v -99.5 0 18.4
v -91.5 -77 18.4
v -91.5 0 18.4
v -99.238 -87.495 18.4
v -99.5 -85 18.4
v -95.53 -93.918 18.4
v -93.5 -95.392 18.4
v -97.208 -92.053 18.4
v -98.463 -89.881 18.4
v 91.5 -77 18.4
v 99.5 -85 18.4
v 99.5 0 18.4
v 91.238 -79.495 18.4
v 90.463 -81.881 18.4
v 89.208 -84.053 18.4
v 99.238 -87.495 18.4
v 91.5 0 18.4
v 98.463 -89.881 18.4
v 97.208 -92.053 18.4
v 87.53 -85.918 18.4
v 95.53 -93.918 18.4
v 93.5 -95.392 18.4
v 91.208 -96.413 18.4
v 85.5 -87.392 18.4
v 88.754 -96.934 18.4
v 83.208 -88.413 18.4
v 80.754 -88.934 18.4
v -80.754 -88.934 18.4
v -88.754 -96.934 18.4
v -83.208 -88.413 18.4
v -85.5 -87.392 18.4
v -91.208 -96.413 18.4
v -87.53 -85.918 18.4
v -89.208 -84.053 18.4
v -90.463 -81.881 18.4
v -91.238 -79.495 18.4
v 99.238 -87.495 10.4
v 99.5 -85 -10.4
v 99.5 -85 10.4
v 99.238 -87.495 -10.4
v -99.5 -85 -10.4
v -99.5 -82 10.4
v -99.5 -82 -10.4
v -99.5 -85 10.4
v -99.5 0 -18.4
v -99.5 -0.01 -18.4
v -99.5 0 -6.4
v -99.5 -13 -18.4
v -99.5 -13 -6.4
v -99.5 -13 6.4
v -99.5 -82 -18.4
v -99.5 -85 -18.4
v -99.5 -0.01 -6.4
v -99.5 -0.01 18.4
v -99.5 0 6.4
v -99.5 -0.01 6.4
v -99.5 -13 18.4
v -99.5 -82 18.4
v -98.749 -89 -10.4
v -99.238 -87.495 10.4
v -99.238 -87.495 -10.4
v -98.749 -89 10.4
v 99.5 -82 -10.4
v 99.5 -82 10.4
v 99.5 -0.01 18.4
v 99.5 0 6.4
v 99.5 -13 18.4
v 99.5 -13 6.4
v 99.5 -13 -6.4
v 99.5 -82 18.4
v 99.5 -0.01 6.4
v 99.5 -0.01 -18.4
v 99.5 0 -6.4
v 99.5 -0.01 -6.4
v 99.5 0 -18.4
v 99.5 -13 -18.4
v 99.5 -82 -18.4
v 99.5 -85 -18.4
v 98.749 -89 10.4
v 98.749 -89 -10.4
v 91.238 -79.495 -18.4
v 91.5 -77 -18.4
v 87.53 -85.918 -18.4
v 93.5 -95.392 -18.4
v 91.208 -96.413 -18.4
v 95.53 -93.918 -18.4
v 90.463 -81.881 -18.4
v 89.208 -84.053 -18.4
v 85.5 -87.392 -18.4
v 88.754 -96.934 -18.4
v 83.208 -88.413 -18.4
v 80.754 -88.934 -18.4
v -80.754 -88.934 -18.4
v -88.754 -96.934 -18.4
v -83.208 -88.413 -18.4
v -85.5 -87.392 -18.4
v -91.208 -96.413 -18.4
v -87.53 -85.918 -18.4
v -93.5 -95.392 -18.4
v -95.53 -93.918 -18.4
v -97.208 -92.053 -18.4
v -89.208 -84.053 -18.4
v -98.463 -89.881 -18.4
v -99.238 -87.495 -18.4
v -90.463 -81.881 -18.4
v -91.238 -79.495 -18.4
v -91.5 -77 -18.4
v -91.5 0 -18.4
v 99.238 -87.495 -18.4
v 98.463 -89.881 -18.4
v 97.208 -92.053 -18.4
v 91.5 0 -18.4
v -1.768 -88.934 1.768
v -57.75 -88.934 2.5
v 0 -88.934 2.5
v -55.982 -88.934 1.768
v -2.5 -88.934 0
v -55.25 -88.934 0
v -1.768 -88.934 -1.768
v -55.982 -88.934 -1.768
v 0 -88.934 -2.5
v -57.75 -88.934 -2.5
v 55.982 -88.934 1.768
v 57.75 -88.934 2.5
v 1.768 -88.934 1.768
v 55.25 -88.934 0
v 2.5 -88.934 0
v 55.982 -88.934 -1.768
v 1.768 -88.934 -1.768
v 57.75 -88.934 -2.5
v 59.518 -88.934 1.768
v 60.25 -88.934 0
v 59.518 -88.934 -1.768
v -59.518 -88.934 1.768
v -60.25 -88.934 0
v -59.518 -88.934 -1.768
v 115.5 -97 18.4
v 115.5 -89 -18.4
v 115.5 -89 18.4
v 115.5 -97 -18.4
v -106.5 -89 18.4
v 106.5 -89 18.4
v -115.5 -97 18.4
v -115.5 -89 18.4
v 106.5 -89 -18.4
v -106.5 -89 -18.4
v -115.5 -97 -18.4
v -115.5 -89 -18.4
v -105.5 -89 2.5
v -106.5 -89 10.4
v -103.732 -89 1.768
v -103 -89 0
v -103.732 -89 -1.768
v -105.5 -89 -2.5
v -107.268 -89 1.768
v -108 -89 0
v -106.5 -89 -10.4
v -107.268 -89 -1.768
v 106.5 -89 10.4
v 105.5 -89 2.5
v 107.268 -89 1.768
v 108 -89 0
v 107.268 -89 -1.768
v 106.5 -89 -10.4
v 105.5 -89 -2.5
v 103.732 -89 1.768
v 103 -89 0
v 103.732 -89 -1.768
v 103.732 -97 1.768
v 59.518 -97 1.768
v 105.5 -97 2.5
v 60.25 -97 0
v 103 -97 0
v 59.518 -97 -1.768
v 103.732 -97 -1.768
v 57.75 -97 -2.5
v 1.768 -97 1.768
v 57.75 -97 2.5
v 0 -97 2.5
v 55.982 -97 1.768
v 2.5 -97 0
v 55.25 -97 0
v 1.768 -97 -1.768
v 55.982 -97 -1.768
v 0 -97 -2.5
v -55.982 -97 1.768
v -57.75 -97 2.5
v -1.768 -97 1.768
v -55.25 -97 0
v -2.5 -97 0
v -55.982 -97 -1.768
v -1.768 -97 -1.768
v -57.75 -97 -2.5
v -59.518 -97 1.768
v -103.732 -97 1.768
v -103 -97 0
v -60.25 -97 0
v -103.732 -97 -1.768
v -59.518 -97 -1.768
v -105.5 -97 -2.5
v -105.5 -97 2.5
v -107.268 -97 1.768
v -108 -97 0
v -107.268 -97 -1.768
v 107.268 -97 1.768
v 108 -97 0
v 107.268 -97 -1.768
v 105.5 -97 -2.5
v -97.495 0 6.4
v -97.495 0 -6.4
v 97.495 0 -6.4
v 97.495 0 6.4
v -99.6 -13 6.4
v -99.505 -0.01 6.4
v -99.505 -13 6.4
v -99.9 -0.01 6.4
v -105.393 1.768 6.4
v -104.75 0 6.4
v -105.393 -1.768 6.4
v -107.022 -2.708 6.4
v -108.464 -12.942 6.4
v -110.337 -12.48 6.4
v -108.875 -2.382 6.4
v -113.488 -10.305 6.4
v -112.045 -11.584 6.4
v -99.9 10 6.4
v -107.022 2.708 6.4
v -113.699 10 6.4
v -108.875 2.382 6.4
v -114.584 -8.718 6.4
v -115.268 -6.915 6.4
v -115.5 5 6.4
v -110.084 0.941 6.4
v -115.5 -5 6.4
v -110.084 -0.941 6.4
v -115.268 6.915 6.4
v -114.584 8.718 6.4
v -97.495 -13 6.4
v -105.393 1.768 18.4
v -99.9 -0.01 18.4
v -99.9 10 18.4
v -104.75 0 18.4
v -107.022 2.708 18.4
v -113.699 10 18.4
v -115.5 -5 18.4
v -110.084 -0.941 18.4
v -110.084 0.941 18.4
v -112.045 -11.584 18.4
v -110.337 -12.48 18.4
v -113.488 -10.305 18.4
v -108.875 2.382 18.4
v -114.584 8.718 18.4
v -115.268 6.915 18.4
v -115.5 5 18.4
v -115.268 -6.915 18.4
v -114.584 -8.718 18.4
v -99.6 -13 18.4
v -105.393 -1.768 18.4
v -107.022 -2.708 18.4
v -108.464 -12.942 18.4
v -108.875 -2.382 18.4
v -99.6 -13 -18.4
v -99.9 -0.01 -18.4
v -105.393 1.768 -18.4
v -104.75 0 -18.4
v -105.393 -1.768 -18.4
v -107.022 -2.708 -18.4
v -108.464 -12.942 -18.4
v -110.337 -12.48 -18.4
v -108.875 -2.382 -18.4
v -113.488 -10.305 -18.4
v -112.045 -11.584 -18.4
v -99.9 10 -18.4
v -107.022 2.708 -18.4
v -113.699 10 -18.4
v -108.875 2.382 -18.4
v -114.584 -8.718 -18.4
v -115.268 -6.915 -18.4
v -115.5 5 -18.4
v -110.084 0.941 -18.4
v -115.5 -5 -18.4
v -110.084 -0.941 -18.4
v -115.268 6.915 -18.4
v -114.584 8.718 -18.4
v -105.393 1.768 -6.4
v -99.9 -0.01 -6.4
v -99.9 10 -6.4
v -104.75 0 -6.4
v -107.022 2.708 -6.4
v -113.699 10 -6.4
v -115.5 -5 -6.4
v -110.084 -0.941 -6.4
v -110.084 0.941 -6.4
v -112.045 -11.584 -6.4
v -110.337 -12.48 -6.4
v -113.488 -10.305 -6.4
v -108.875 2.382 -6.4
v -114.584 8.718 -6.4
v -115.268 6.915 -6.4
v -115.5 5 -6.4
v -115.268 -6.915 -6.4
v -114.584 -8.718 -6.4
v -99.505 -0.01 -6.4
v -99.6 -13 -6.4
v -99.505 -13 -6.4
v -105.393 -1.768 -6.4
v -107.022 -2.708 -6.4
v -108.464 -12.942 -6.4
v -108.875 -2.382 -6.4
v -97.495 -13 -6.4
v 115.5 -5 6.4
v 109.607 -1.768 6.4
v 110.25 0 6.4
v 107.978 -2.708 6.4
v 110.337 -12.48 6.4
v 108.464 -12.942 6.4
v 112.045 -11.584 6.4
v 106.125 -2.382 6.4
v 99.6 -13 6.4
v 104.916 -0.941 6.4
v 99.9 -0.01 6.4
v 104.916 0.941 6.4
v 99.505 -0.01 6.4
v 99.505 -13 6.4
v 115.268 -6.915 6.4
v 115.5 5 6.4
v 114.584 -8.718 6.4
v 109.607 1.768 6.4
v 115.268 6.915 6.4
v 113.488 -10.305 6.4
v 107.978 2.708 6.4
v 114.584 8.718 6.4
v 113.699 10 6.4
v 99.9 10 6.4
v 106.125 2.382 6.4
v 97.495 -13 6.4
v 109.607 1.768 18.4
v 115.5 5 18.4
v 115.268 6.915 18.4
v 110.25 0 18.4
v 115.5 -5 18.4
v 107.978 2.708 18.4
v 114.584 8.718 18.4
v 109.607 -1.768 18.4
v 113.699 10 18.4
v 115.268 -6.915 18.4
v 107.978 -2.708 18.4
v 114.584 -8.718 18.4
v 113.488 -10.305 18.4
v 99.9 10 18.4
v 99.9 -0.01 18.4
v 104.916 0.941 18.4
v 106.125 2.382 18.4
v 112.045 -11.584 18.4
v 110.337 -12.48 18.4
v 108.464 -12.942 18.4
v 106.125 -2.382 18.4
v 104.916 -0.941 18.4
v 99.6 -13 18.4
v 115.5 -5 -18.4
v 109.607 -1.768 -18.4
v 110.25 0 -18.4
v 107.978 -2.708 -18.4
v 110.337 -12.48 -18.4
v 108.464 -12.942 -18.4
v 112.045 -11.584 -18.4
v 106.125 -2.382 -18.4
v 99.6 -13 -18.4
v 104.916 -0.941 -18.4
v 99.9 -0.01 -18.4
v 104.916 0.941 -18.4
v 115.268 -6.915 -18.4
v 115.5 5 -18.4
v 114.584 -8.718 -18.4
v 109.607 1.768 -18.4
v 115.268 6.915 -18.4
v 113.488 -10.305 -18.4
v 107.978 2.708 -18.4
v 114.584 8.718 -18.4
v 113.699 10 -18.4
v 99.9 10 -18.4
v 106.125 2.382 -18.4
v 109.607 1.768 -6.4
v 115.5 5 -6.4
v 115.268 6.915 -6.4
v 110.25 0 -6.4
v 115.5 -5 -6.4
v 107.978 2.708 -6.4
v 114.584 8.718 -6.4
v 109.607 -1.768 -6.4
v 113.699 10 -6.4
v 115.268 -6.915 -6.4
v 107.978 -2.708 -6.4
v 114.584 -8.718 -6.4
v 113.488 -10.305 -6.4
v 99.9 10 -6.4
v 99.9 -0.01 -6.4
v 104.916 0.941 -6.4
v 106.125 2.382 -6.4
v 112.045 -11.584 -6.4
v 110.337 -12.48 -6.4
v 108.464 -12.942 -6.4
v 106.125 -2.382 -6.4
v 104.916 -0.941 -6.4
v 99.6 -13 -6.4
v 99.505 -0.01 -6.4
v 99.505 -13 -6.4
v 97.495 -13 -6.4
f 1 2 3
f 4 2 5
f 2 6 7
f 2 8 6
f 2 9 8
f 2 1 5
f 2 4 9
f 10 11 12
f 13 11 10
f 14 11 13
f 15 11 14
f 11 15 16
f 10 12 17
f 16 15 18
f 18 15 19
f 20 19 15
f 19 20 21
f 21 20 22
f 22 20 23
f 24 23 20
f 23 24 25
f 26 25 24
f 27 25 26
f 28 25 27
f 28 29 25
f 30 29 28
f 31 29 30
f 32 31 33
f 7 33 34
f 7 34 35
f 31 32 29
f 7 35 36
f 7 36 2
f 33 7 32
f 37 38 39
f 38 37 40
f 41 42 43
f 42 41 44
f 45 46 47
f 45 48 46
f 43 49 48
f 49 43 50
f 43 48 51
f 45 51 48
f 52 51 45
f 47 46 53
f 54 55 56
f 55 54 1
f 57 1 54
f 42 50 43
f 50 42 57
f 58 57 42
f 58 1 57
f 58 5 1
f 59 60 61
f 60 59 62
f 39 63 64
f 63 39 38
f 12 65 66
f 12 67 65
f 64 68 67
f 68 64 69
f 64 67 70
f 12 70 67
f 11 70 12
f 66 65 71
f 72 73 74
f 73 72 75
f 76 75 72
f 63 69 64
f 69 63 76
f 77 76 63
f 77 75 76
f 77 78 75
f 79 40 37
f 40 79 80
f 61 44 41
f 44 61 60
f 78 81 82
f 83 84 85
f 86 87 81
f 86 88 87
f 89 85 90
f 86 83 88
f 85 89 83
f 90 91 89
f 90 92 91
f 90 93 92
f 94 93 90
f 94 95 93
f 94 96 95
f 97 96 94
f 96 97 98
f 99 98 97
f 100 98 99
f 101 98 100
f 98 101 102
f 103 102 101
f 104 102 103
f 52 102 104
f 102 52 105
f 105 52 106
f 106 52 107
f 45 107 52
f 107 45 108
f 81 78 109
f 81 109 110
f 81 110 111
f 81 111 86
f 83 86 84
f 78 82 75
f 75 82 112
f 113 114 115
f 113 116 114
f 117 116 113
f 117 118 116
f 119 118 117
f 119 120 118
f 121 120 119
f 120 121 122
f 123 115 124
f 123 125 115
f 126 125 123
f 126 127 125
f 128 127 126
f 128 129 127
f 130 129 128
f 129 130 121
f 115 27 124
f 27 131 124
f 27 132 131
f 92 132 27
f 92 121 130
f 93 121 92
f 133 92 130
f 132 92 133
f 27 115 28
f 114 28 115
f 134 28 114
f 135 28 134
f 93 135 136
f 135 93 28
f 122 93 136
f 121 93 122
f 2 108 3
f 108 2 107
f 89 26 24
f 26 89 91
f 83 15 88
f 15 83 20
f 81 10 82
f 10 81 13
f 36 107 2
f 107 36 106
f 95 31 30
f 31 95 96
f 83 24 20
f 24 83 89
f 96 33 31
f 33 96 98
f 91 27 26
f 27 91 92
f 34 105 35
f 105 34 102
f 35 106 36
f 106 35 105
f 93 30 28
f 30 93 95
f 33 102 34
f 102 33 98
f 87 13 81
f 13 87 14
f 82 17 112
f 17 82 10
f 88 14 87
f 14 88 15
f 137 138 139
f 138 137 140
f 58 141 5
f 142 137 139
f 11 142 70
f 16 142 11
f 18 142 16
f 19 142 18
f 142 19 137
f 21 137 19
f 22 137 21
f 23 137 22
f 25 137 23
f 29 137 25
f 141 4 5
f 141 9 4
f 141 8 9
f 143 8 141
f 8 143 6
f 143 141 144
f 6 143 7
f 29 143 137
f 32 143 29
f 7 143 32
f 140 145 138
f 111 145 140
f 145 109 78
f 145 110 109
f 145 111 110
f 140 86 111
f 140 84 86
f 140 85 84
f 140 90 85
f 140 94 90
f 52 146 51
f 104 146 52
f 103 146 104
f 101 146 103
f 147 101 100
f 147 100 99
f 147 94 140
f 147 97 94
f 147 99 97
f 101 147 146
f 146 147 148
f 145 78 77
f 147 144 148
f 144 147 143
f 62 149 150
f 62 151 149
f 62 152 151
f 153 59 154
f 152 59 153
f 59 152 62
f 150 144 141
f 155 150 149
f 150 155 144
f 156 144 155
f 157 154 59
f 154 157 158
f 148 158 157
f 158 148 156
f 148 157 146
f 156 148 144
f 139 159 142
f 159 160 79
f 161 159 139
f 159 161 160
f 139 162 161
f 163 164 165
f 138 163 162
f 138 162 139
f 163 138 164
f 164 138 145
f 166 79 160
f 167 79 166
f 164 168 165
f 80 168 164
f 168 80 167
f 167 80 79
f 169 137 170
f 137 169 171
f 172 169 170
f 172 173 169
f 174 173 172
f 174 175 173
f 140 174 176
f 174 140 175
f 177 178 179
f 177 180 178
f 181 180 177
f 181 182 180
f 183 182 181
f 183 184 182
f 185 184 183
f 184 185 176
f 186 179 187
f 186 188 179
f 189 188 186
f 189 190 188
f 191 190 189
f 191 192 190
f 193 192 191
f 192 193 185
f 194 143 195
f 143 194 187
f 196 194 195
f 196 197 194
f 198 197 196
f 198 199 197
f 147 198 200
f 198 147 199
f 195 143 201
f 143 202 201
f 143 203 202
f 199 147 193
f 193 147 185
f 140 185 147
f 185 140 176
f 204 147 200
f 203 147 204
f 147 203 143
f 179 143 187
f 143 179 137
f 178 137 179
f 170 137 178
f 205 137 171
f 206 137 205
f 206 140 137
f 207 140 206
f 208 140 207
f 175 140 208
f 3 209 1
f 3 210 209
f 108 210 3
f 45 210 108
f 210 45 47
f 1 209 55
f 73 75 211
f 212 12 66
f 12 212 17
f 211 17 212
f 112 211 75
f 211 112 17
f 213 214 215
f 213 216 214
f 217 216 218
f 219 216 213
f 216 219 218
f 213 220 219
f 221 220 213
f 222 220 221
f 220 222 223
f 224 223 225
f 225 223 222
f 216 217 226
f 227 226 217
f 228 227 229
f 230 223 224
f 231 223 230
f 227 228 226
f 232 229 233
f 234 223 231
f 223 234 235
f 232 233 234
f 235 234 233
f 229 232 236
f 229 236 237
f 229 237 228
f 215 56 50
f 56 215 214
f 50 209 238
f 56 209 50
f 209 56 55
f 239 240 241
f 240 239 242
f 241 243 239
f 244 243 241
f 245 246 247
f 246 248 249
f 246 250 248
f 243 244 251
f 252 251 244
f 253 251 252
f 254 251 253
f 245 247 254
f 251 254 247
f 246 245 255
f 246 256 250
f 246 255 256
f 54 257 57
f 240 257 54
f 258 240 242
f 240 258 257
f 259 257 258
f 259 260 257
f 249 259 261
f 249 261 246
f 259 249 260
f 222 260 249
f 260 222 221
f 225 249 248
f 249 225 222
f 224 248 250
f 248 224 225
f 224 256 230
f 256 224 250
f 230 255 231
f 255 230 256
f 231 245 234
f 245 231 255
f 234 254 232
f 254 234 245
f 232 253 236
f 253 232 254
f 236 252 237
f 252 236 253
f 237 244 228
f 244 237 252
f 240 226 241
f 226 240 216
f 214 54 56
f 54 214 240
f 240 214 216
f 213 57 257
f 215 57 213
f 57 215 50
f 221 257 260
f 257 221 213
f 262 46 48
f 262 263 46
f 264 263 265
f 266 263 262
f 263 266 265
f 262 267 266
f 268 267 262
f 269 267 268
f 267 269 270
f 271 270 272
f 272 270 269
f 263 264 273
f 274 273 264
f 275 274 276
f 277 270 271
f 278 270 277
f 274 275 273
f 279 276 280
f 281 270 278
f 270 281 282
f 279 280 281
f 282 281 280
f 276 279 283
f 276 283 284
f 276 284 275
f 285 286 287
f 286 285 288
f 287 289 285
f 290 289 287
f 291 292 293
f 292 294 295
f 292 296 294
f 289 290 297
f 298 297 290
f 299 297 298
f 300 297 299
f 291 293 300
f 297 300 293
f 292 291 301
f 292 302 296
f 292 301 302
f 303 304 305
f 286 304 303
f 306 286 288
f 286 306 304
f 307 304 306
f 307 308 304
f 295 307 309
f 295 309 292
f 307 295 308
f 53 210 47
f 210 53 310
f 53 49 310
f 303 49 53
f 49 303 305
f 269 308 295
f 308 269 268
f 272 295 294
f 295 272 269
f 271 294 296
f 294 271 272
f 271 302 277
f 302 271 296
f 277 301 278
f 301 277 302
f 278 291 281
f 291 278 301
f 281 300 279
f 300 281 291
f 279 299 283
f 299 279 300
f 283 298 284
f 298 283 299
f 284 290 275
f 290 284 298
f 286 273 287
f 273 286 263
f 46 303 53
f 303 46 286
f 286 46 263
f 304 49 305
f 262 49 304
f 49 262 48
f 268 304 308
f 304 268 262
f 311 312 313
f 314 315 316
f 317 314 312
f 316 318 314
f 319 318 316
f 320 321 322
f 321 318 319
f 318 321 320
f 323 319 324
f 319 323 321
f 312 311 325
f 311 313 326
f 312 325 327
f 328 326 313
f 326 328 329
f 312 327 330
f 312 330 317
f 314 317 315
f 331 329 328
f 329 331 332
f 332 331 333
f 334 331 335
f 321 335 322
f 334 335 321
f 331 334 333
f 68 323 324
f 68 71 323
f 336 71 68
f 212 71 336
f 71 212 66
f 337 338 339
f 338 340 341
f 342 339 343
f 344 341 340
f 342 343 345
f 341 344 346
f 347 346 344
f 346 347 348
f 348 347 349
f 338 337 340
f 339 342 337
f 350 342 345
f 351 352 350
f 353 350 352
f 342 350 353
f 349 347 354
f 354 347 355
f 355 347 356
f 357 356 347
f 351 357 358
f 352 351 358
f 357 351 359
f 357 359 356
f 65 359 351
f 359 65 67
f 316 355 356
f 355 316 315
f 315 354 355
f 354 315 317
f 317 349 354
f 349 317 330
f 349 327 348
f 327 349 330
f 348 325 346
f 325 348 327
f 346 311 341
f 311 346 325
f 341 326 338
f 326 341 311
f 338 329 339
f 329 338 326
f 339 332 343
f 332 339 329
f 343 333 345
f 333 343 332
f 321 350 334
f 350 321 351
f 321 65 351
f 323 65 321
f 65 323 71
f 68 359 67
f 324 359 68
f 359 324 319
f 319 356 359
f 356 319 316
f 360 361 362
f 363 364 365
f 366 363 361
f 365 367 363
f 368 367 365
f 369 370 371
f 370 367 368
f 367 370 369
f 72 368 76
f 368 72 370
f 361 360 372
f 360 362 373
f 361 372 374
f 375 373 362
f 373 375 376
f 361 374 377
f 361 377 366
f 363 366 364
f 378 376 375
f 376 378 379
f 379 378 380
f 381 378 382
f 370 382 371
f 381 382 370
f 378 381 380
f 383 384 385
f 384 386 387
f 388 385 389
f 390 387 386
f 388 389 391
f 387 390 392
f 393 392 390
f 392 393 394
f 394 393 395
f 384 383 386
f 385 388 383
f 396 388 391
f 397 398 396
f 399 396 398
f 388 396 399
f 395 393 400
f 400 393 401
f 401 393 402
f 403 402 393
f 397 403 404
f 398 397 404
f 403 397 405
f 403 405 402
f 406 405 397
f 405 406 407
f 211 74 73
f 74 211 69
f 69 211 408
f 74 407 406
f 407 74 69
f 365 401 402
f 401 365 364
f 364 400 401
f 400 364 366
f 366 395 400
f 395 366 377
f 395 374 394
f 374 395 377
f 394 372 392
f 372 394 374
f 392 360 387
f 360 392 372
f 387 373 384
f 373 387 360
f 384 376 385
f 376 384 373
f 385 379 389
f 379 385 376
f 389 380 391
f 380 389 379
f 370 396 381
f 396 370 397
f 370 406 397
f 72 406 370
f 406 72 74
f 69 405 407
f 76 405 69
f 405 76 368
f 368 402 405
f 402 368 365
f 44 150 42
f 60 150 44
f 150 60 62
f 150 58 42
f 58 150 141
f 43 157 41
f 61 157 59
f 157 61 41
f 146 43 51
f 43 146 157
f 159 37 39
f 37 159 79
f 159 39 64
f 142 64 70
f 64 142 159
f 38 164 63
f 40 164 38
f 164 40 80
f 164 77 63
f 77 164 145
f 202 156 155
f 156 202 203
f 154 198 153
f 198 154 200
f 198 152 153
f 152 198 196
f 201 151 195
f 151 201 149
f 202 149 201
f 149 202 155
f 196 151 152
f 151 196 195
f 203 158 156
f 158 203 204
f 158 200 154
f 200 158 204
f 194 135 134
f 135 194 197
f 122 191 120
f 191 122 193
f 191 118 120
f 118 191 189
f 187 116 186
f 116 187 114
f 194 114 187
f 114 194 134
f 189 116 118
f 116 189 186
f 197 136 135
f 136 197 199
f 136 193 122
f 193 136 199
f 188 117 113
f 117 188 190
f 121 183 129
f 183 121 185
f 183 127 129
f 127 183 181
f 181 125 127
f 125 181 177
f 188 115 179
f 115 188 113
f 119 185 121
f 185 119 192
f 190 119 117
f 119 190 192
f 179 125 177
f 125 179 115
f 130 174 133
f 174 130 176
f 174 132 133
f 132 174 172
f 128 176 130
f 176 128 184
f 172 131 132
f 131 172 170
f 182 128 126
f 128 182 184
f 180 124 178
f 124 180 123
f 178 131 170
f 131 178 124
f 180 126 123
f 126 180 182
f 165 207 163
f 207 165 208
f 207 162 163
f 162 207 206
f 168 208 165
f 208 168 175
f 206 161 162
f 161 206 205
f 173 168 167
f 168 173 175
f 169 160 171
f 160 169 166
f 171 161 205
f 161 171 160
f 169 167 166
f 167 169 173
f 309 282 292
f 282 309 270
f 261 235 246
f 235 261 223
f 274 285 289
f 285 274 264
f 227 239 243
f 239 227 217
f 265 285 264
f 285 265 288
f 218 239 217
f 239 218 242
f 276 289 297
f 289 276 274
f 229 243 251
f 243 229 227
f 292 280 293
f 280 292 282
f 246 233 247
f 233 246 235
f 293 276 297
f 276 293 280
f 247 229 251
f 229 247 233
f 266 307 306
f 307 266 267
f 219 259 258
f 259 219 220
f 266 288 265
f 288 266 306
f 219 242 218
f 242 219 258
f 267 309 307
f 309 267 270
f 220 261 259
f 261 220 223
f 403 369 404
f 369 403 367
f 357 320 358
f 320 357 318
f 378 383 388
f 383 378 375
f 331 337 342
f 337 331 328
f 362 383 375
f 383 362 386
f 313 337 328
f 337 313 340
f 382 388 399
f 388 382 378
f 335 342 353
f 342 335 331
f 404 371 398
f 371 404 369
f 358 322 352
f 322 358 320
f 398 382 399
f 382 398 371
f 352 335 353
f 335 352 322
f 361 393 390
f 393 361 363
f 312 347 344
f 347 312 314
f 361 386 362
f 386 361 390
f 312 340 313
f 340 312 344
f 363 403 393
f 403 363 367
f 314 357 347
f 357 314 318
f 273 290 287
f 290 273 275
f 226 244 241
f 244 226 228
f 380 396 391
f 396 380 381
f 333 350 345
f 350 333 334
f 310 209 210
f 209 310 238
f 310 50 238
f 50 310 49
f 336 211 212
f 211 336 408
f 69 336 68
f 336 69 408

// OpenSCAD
// file: collar.scad
module raw_collar_profile(w, d, r, wall) {
    difference() {
        union() {
            // 1. Pristine rounded hopper profile ring core
            difference() {
                minkowski() {
                    cube([w + wall*2 - r*2, d + wall*2 - r*2, collar_height], center=true);
                    cylinder(r=r, h=0.001, center=true);
                }
                minkowski() {
                    cube([w - r*2, d - r*2, collar_height + 5], center=true);
                    cylinder(r=r, h=0.001, center=true);
                }
            }
            // 2. Integrated flat mounting wall flange (Kept sharp and flat)
            translate([0, back_y_outer + wall/2, 0])
                cube([backplate_w, wall, collar_height], center=true);
        }
        // Clean out any inner wall bleed from the flat flange block
        minkowski() {
            cube([w - r*2, d - r*2, collar_height + 5], center=true);
            cylinder(r=r, h=0.001, center=true);
        }
    }
}
// file: ear_knuckle.scad
include <params.scad>

module raw_collar_profile(w, d, r, wall) {
    difference() {
        union() {
            // 1. Pristine rounded hopper profile ring core
            difference() {
                minkowski() {
                    cube([w + wall*2 - r*2, d + wall*2 - r*2, collar_height], center=true);
                    cylinder(r=r, h=0.001, center=true);
                }
                minkowski() {
                    cube([w - r*2, d - r*2, collar_height + 5], center=true);
                    cylinder(r=r, h=0.001, center=true);
                }
            }
            // 2. Integrated flat mounting wall flange (Kept sharp and flat)
            translate([0, back_y_outer + wall/2, 0])
                cube([backplate_w, wall, collar_height], center=true);
        }
        // Clean out any inner wall bleed from the flat flange block
        minkowski() {
            cube([w - r*2, d - r*2, collar_height + 5], center=true);
            cylinder(r=r, h=0.001, center=true);
        }
    }
}

// Symmetrical layout math prevents all distortion, fins, and steps
module ear_knuckle_profile(w, d, h, r, x_sign, clear_inner = 0) {
    overlap = 2.0; 
    mirror([x_sign == -1 ? 1 : 0, 0, 0]) {
        linear_extrude(height = h, center = true) {
            difference() {
                // Combine the rounded ear profile with a rock-solid wall anchor pad
                union() {
                    hull() {
                        translate([-w/2, -d/2]) square([0.1, d]);
                        translate([w/2 - r, -d/2 + r]) circle(r);
                        translate([w/2 - r,  d/2 - r]) circle(r); 
                    }
                    translate([-w/2 - overlap, -d/2]) square([overlap + 0.1, d]);
                }
                // Crisp 90-degree rectangle cutout for the slider clearance face (Y >= 0)
                if (clear_inner > 0) {
                    translate([-w/2 - overlap - 0.1, -0.01]) 
                        square([overlap + clear_inner + 0.1, d/2 + 0.1]);
                }
            }
        }
    }
}
// file: params.scad
// --- PRECISE ONEISALL 5L RECTANGULAR HOPPER DIMENSIONS ---
tank_width         = 180;
tank_depth         = 175;
tank_corner_radius = 12;
clamp_height       = 36;
wall_thickness     = 8;
clearance          = 1.5;
screw_hole_dia     = 5.0;

// --- VERTICAL DROP PIN SETTINGS ---
pin_hole_dia  = 5.5;
pin_clearance = 0.4;

// --- HINGE KNUCKLE CLEARANCE ---
knuckle_relief = 0.8;

// --- ASSEMBLY CLEARANCE ---
split_chamfer   = 3.0;
hinge_clearance = 0.4; // The exact horizontal gap needed for a clean sliding fit

// --- HINGE SMOOTHING ---
ear_corner_radius = 8;

/* [Hidden] */
w_inner         = tank_width  + clearance * 2;
d_inner         = tank_depth  + clearance * 2;
ear_width       = 16;
ear_depth       = 26;
knuckle_layer_h = clamp_height / 3;
middle_ear_h    = knuckle_layer_h - pin_clearance - knuckle_relief;
bisect_half     = d_inner / 2 + wall_thickness * 2 + 30;
ear_x           = w_inner / 2 + wall_thickness + ear_width / 2;
ear_z_ctr       = knuckle_layer_h + knuckle_relief / 2;

// Dynamic collar height matching the knuckle vertical thresholds perfectly
collar_height   = ear_z_ctr * 2 + knuckle_layer_h; 

// Compact wing width spans exactly to the outer edge of the hinge knuckles
backplate_w     = (ear_x + ear_width/2) * 2;
back_y_outer    = -(d_inner / 2 + wall_thickness);
// main file
include <params.scad>
include <ear_knuckle.scad>
include <collar.scad>

back_clamp();

module back_clamp() {
    difference() {
        union() {
            // Main unified flat-back hoop body
            difference() {
                raw_collar_profile(w_inner, d_inner, tank_corner_radius, wall_thickness);
                translate([0, bisect_half, 0])
                    cube([w_inner*3, bisect_half*2, collar_height + 40], center=true);
            }
            
            for (x_sign = [-1, 1]) {
                translate([x_sign * ear_x, 0, 0]) {
                    translate([0, 0,  ear_z_ctr])
                        ear_knuckle_profile(ear_width, ear_depth, knuckle_layer_h, ear_corner_radius, x_sign, hinge_clearance);
                    translate([0, 0, -ear_z_ctr])
                        ear_knuckle_profile(ear_width, ear_depth, knuckle_layer_h, ear_corner_radius, x_sign, hinge_clearance);
                }
            }

            // Four corner gussets at backplate/side-wall junctions.
            // Polygon in X-Y plane, extruded in Z.
            // Origin at (x_anchor, back_y_outer): backplate outer face, side wall outer face.
            // Polygon runs +Y along side wall, +X along backplate, with overlap into collar wall.
            stiff_w   = 15; // along backplate in +X
            stiff_d   = 15; // along side wall in +Y
            stiff_h   =  8; // Z height
            overlap_x =  5; // overlap into collar wall in -X to close gap
            x_anchor  = w_inner / 2 + wall_thickness;

            // x_sign = +1
            translate([x_anchor, back_y_outer, collar_height/2 - stiff_h])
                linear_extrude(height = stiff_h)
                    polygon([[0,0],[stiff_w,0],[0,stiff_d],[-overlap_x,0]]);
            translate([x_anchor, back_y_outer, -collar_height/2])
                linear_extrude(height = stiff_h)
                    polygon([[0,0],[stiff_w,0],[0,stiff_d],[-overlap_x,0]]);

            // x_sign = -1: mirror in X
            mirror([1,0,0]) {
                translate([x_anchor, back_y_outer, collar_height/2 - stiff_h])
                    linear_extrude(height = stiff_h)
                        polygon([[0,0],[stiff_w,0],[0,stiff_d],[-overlap_x,0]]);
                translate([x_anchor, back_y_outer, -collar_height/2])
                    linear_extrude(height = stiff_h)
                        polygon([[0,0],[stiff_w,0],[0,stiff_d],[-overlap_x,0]]);
            }
        }
        
        for (x = [-backplate_w/2 + 10, -backplate_w/4, 0, backplate_w/4, backplate_w/2 - 10])
            translate([x, back_y_outer + wall_thickness/2, 0])
                rotate([-90,0,0]) cylinder(h=wall_thickness * 3, d=screw_hole_dia, center=true);
                
        for (x_sign = [-1, 1])
            translate([x_sign * ear_x, 0, 0])
                cylinder(h=collar_height + 10, d=pin_hole_dia, center=true);
        
        for (x_sign = [-1, 1])
            for (z_sign = [-1, 1])
                translate([x_sign * ear_x, (ear_depth/2 - split_chamfer/2) + 0.01, z_sign * ear_z_ctr])
                    cube([ear_width + 2, split_chamfer + 0.02, knuckle_layer_h + 0.1], center=true);
                    
        knuckle_gap  = 2 * (ear_z_ctr - knuckle_layer_h/2);  
        relief_depth = 2;                                    
        for (x_sign = [-1, 1])
            translate([x_sign * (w_inner/2 + wall_thickness - relief_depth/2), -ear_depth/4, 0])
                cube([relief_depth + 0.01, ear_depth/2, knuckle_gap], center=true);
    }
}
